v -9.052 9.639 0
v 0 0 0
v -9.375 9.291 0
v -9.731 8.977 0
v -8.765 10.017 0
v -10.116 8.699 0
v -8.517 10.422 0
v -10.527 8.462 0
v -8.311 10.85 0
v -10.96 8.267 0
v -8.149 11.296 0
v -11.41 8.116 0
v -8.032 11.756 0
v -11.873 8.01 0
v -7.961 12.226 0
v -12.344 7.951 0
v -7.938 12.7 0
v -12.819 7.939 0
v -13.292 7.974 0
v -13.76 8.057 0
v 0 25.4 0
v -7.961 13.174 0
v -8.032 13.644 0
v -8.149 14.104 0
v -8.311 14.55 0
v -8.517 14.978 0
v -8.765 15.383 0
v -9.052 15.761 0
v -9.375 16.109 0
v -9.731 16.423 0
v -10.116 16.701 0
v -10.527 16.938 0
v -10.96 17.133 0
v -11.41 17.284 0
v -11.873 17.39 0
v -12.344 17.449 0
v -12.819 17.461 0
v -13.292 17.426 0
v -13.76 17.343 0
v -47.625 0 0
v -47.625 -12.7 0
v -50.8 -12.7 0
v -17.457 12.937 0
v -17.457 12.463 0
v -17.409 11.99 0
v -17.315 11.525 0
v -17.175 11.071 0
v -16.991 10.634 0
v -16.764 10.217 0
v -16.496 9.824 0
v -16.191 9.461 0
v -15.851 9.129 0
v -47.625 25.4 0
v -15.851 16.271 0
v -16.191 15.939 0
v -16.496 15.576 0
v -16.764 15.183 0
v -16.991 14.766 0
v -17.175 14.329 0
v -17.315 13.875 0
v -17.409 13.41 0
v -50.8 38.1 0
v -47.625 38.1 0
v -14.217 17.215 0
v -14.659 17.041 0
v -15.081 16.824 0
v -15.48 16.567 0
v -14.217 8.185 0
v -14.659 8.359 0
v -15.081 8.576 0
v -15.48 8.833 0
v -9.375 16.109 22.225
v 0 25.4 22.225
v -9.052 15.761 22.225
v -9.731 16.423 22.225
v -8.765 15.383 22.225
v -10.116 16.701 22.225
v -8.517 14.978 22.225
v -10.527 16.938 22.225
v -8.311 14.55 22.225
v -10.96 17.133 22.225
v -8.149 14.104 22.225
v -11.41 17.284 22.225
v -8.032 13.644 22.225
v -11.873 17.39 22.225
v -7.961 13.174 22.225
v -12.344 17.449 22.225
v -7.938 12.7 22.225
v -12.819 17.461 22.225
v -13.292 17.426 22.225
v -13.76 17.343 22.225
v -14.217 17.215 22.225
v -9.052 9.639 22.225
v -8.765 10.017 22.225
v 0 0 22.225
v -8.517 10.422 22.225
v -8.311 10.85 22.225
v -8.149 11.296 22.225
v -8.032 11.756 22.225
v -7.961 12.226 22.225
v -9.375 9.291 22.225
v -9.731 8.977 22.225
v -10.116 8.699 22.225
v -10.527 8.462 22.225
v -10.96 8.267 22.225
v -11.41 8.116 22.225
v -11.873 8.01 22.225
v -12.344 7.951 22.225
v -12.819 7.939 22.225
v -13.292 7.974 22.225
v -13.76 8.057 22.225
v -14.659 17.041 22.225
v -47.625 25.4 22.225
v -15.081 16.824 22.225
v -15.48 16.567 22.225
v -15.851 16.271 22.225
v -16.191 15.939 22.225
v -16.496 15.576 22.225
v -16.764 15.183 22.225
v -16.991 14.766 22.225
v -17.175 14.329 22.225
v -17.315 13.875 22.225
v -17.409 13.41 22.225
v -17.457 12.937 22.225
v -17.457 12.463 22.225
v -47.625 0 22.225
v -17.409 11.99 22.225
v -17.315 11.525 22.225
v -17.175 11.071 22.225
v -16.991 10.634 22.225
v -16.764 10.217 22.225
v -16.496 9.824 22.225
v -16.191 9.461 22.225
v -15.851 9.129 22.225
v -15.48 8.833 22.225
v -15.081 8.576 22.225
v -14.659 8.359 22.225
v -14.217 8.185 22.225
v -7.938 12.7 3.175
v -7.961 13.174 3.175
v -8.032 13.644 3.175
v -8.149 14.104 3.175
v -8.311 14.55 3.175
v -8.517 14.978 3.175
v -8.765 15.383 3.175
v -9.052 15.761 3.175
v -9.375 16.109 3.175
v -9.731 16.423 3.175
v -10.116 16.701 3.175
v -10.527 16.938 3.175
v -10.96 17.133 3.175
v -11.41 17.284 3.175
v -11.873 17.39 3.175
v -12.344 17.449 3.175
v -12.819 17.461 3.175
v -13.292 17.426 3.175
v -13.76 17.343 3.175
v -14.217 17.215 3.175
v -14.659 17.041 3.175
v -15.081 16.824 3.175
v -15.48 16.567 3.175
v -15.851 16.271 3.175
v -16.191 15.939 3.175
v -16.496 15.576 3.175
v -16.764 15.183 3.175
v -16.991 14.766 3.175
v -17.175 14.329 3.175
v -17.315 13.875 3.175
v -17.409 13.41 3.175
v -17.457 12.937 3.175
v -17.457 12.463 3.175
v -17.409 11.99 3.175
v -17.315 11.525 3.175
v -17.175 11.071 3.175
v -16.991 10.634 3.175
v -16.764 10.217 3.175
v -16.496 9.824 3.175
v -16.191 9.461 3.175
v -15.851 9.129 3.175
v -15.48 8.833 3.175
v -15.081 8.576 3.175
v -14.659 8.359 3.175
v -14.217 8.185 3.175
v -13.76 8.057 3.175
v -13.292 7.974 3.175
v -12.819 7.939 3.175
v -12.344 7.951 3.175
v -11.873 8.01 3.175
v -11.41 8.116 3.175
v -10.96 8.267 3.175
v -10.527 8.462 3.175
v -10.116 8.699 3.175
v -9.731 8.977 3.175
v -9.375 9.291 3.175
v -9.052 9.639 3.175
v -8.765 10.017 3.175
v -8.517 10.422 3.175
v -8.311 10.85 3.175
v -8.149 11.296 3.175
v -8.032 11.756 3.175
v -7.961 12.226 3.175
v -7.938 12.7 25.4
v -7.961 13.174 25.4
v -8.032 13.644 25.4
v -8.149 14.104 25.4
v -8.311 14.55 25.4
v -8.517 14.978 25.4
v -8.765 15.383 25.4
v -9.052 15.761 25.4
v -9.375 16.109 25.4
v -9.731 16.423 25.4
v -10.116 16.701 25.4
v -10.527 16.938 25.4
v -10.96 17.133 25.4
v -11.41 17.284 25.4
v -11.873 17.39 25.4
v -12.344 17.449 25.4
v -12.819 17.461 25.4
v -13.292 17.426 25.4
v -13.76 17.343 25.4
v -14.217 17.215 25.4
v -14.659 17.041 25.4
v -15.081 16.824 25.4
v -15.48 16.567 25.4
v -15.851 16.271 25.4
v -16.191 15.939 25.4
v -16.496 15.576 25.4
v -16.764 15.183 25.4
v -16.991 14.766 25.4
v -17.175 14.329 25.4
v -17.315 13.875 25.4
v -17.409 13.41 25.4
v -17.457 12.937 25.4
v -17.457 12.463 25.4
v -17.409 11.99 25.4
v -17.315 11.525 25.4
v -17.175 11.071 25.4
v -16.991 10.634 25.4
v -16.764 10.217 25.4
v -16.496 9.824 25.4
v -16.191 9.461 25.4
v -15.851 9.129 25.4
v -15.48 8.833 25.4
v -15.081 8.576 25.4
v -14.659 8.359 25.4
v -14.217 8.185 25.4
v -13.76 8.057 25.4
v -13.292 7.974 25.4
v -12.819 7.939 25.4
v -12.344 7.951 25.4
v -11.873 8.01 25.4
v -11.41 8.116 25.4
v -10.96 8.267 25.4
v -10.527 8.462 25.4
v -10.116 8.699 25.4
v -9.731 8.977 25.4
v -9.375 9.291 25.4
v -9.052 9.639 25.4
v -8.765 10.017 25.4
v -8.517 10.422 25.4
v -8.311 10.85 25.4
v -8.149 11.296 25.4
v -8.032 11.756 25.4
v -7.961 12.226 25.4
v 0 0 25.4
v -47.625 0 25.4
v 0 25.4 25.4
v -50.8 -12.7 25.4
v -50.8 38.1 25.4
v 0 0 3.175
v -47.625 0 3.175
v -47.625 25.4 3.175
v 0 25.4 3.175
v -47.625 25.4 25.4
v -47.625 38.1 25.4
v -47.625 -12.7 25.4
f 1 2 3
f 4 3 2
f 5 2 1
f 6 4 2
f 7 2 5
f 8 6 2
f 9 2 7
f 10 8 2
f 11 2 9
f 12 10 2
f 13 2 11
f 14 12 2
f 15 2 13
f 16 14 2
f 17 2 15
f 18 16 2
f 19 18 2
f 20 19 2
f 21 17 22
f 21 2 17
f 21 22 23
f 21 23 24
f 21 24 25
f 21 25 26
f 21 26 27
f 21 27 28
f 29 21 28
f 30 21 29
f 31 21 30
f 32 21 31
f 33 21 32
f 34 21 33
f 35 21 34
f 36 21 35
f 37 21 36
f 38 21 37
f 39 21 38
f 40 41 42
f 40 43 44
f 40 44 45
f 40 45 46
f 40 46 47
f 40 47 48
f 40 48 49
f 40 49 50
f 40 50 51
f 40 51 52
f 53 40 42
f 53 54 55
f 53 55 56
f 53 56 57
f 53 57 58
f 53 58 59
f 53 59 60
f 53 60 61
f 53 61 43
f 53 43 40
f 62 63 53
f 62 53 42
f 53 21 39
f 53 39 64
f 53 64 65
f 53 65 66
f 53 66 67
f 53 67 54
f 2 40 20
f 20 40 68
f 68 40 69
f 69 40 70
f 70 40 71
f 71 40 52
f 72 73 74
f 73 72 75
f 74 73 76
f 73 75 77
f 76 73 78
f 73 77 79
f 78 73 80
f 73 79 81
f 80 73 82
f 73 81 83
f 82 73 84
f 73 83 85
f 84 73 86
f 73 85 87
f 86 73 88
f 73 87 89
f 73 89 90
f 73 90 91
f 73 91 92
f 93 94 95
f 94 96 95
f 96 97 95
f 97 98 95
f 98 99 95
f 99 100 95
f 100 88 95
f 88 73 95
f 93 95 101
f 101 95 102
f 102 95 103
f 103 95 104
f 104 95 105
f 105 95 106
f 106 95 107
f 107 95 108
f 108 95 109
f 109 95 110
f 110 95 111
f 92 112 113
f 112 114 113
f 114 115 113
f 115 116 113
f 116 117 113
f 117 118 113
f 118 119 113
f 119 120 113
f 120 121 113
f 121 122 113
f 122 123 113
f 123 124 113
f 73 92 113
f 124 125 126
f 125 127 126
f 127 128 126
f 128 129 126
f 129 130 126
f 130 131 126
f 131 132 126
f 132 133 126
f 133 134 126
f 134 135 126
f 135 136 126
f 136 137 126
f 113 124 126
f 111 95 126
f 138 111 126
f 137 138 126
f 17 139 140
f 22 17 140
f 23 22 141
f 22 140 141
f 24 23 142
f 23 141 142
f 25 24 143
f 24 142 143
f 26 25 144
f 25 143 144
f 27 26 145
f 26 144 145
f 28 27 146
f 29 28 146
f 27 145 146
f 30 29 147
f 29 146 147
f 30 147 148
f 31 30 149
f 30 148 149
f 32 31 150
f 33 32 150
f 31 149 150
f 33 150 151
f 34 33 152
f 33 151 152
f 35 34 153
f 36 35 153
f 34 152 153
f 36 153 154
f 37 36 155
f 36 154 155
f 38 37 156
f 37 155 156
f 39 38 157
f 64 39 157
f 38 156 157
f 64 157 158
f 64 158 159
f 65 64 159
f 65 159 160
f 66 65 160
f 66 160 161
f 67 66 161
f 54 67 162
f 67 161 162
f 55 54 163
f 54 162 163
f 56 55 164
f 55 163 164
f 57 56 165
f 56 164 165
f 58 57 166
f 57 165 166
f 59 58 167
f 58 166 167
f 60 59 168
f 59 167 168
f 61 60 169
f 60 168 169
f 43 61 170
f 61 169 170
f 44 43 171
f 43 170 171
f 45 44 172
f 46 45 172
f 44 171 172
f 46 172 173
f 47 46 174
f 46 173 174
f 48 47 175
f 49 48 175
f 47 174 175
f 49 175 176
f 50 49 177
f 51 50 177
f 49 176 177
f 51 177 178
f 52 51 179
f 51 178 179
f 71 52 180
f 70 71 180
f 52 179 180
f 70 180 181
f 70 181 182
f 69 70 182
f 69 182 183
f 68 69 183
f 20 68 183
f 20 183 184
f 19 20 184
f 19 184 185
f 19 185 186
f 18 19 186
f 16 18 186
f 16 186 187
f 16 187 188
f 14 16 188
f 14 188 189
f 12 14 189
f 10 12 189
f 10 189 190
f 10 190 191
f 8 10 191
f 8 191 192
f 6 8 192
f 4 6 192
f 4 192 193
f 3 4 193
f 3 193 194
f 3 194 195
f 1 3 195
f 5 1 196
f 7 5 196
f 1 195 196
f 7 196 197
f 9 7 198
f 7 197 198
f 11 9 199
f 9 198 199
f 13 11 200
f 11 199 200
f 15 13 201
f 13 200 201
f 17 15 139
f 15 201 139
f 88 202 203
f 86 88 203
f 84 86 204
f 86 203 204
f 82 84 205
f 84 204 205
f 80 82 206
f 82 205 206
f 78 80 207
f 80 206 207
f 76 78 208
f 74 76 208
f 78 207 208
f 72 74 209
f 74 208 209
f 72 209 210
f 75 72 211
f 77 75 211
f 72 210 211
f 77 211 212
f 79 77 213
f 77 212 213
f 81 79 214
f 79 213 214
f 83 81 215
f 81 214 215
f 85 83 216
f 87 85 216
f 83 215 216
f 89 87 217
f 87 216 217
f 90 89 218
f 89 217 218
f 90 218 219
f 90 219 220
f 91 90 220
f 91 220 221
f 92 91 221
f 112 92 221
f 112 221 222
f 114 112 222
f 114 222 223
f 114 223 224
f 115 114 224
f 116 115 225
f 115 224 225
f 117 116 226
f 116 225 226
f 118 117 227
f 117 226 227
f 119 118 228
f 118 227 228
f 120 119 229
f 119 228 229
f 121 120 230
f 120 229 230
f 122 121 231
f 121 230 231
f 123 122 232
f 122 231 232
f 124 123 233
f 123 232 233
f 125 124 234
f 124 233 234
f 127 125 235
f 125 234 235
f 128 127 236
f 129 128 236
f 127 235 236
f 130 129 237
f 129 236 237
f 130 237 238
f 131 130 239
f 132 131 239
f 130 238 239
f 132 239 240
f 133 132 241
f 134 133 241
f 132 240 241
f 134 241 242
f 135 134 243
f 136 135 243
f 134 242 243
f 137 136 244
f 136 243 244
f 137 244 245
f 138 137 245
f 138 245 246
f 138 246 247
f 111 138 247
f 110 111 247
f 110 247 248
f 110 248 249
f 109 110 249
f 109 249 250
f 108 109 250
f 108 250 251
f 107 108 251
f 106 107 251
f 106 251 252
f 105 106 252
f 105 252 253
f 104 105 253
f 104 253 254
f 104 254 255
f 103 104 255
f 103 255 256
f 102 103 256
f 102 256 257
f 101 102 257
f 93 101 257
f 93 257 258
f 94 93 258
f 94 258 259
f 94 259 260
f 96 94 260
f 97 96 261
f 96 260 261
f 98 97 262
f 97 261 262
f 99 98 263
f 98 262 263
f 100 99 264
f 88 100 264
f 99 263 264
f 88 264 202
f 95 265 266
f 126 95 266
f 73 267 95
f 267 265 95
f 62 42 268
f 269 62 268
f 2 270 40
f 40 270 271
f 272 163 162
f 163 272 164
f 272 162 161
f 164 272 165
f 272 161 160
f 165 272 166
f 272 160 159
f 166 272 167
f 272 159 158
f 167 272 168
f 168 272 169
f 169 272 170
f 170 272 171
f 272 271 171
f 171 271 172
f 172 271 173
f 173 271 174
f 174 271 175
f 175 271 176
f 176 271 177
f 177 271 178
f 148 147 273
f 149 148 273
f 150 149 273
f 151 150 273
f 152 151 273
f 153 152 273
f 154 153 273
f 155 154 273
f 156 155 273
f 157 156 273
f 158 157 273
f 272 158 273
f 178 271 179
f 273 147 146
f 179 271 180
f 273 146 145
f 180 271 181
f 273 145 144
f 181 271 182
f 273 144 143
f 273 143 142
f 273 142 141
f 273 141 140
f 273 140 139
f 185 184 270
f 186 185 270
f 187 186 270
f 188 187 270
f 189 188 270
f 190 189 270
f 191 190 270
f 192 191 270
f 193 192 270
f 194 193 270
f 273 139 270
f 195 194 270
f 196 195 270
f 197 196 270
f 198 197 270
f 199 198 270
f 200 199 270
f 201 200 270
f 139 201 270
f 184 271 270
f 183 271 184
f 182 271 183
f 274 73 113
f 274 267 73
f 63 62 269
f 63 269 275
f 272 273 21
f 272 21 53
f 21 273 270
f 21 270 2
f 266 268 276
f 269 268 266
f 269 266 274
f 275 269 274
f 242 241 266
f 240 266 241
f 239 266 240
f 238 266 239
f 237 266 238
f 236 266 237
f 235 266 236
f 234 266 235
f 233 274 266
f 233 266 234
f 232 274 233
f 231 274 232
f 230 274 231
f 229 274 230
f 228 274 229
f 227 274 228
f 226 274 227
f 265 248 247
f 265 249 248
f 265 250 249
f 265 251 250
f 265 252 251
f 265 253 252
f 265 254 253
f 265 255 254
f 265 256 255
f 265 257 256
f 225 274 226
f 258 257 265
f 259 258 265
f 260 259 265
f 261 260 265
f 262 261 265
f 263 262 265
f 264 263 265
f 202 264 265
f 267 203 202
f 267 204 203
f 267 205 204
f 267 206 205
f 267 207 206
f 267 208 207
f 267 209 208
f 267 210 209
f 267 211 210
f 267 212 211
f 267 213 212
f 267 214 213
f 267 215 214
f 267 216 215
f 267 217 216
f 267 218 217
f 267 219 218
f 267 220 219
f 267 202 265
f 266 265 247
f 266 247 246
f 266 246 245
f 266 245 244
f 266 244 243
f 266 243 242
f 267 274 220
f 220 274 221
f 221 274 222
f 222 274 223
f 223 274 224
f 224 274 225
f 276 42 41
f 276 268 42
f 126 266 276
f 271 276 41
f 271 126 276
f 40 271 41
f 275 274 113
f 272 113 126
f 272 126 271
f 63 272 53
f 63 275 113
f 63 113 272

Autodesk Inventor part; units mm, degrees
ref_plane "YZ Plane" through (0, 0, 0) normal (1, 0, 0) x (0, 1, 0)
ref_plane "XZ Plane" through (0, 0, 0) normal (0, 1, 0) x (-1, 0, 0)
ref_plane "XY Plane" through (0, 0, 0) normal (0, 0, 1) x (1, 0, 0)
sketch "Sketch1" plane through (0, 0, 0) normal (0, 1, 0) x (-1, 0, 0)
  line L0 (0, 0) -> (50.8, 0)
  line L1 (50.8, 0) -> (50.8, 25.4)
  line L2 (50.8, 25.4) -> (0, 25.4)
  line L3 (0, 25.4) -> (0, 22.225)
  line L4 (0, 22.225) -> (47.625, 22.225)
  line L5 (47.625, 22.225) -> (47.625, 3.175)
  line L6 (47.625, 3.175) -> (0, 3.175)
  line L7 (0, 3.175) -> (0, 0)
  dimension "d0" = 3.175
  dimension "d1" = 3.175
  dimension "d2" = 19.05
  dimension "d3" = 50.8
extrude "Extrusion1" add sketch "Sketch1" along normal blind 25.4
sketch "Sketch2" plane through (0, 25.4, 0) normal (0, 1, 0) x (1, 0, 0)
  line L0 (-50.8, -25.4) -> (0, -25.4) projected
  line L1 (-50.8, -25.4) -> (-47.625, -25.4)
  line L2 (-47.625, -25.4) -> (-47.625, 0)
  line L3 (-47.625, 0) -> (-50.8, 0)
  line L4 (-50.8, 0) -> (-50.8, -25.4)
  line L5 (-47.625, -22.225) -> (-47.625, -3.175) projected
  line L6 (0, 0) -> (-50.8, 0) projected
extrude "Extrusion2" add sketch "Sketch2" along normal blind 12.7
sketch "Sketch3" plane through (0, 0, 0) normal (0, -1, 0) x (1, 0, 0)
  line L0 (-50.8, 25.4) -> (0, 25.4) projected
  line L1 (0, 0) -> (-47.625, 0) projected
  line L2 (-50.8, 25.4) -> (-47.625, 25.4)
  line L3 (-47.625, 25.4) -> (-47.625, 0)
  line L4 (-47.625, 0) -> (-50.8, 0)
  line L5 (-50.8, 0) -> (-50.8, 25.4)
extrude "Extrusion3" add sketch "Sketch3" along normal blind 12.7
sketch "Sketch4" plane through (-47.625, 0, 25.4) normal (0, 0, 1) x (1, 0, 0)
  circle A0 centre (34.925, 12.7) radius 4.7625
  line L0 (0, 0) -> (47.625, 0) projected
  line L1 (47.625, 0) -> (47.625, 25.4) projected
  dimension "d10" = 9.525
  dimension "d11" = 12.7
  dimension "d12" = 12.7
extrude "Extrusion4" cut sketch "Sketch4" against normal blind 25.4
properties part number "base" material "Aluminum 6061"
